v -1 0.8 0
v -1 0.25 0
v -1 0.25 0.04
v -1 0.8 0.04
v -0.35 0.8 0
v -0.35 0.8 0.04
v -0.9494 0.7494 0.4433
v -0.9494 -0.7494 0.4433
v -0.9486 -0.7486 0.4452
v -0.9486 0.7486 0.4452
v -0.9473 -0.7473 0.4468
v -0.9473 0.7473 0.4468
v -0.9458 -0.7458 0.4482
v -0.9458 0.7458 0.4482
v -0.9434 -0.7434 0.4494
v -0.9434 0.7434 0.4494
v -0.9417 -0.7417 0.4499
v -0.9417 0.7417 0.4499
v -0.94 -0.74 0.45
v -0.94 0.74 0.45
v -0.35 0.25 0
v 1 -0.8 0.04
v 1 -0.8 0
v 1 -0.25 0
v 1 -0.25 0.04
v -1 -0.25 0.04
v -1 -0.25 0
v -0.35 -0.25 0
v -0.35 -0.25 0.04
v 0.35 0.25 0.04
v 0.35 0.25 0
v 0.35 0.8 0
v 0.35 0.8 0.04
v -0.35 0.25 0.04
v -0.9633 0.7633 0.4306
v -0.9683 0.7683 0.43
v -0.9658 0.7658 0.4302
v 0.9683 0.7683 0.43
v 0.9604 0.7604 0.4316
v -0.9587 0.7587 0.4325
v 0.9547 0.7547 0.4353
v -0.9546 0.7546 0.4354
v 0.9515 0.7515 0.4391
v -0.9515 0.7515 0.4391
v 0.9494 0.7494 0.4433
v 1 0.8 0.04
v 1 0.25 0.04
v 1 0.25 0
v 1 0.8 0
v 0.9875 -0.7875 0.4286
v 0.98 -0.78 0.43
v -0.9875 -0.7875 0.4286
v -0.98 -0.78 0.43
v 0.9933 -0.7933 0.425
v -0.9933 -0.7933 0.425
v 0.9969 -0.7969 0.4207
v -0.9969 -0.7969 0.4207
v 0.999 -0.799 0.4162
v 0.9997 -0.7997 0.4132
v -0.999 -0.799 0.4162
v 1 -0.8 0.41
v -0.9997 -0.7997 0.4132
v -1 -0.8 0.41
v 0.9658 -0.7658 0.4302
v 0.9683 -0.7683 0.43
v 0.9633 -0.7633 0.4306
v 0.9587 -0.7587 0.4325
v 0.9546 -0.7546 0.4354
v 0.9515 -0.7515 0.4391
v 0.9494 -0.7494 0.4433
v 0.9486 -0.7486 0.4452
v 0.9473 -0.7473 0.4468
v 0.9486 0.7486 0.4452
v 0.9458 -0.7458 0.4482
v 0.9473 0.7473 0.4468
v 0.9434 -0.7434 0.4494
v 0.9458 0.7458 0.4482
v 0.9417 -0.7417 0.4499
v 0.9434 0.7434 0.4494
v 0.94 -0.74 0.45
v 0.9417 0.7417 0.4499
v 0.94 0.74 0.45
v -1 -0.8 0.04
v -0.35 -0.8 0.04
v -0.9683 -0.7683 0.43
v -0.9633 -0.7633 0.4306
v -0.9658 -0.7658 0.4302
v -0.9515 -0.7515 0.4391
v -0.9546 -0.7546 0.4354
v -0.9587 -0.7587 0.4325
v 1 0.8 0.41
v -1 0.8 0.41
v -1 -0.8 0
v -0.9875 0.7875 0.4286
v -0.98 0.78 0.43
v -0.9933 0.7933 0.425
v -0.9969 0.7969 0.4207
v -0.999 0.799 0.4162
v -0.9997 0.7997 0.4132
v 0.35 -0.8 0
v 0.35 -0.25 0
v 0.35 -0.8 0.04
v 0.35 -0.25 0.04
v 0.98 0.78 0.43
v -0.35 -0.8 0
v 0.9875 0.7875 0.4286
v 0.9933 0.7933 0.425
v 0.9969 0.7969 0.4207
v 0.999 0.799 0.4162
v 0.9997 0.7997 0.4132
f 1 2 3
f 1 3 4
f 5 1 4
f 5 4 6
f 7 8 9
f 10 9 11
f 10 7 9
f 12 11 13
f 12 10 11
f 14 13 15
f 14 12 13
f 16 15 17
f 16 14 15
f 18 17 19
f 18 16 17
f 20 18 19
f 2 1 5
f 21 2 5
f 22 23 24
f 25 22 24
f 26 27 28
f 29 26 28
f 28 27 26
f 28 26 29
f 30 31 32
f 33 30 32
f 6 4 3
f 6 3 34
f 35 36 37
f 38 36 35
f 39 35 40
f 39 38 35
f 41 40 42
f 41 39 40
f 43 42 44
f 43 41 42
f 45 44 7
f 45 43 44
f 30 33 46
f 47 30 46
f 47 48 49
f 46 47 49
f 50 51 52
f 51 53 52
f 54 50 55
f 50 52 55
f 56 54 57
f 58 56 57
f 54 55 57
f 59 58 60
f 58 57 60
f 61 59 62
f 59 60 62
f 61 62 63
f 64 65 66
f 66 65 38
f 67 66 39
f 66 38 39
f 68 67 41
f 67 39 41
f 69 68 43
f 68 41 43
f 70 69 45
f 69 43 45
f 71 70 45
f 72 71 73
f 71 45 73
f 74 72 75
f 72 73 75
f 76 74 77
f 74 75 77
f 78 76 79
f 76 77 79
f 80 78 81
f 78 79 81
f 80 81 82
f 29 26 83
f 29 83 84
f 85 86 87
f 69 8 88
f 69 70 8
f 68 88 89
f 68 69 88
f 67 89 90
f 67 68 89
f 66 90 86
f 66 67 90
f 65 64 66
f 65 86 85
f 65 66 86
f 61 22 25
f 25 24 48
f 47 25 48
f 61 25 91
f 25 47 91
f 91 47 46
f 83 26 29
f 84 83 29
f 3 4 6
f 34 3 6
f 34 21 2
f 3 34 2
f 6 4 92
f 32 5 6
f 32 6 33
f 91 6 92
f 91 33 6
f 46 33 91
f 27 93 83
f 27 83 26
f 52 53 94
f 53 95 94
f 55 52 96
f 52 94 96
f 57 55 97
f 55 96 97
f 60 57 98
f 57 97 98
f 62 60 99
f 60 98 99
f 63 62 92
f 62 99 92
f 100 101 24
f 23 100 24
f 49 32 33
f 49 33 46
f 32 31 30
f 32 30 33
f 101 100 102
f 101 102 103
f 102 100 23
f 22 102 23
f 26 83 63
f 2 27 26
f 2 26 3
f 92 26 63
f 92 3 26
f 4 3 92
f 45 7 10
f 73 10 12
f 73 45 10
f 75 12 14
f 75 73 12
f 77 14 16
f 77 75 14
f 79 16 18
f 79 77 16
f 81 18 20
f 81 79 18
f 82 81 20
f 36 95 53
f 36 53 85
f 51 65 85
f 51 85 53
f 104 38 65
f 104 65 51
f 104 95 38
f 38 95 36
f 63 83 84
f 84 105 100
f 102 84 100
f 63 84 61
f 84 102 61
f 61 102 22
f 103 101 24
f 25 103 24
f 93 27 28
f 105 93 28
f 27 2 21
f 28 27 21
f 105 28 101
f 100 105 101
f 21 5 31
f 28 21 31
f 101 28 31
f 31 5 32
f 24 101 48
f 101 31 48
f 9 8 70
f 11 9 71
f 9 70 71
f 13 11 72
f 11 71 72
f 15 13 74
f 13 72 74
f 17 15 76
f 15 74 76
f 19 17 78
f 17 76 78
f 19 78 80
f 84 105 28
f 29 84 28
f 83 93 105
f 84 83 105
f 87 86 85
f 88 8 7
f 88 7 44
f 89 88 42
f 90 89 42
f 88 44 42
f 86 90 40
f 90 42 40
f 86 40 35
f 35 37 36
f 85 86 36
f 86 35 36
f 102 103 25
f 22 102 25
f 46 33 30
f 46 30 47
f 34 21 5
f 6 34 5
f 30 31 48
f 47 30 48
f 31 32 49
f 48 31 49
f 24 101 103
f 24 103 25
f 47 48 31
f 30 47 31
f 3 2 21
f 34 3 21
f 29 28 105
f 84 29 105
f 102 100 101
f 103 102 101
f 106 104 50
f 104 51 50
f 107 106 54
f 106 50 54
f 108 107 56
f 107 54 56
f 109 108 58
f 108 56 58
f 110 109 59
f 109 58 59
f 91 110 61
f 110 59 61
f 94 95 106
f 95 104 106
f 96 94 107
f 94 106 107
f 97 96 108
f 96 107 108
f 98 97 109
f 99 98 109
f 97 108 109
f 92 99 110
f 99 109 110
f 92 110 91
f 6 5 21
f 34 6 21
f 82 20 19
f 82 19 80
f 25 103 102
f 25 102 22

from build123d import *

# Parameters (mm, degrees)
SKETCH1_W             = 0.65
SKETCH1_H             = 0.55
BOSS_EXTRUDE1_DEPTH   = 0.04
BOSS_EXTRUDE1_2_DEPTH = 0.04
BOSS_EXTRUDE1_3_DEPTH = 0.04
BOSS_EXTRUDE1_4_DEPTH = 0.04
BOSS_EXTRUDE2_DEPTH   = 0.43
BOSS_EXTRUDE3_START   = 0.04
SKETCH1_4_W           = 0.65
SKETCH1_4_H           = 0.55
BOSS_EXTRUDE3_DEPTH   = 0.39
BOSS_EXTRUDE3_2_DEPTH = 0.39
BOSS_EXTRUDE3_3_DEPTH = 0.39
BOSS_EXTRUDE3_4_DEPTH = 0.39
SKETCH2_W             = 1.9
SKETCH2_H             = 1.5
BOSS_EXTRUDE4_DEPTH   = 0.02
FILLET1_R             = 0.01
FILLET4_R             = 0.02


with BuildPart() as part:
    # Sketch1 → Boss-Extrude1 (new body)
    with BuildSketch(Plane.XY):
        with Locations((-0.675, 0.525)):
            Rectangle(SKETCH1_W, SKETCH1_H)
    extrude(amount=BOSS_EXTRUDE1_DEPTH)


with BuildPart() as body_2:
    # Sketch1 → Boss-Extrude1 2 (new body)
    with BuildSketch(Plane.XY):
        with Locations((0.675, 0.525)):
            Rectangle(SKETCH1_W, SKETCH1_H)
    extrude(amount=BOSS_EXTRUDE1_2_DEPTH)


with BuildPart() as body_3:
    # Sketch1 → Boss-Extrude1 3 (new body)
    with BuildSketch(Plane.XY):
        with Locations((0.675, -0.525)):
            Rectangle(SKETCH1_W, SKETCH1_H)
    extrude(amount=BOSS_EXTRUDE1_3_DEPTH)


with BuildPart() as body_4:
    # Sketch1 → Boss-Extrude1 4 (new body)
    with BuildSketch(Plane.XY):
        with Locations((-0.675, -0.525)):
            Rectangle(SKETCH1_W, SKETCH1_H)
    extrude(amount=BOSS_EXTRUDE1_4_DEPTH)


with BuildPart() as body_5:
    # Sketch1<3> → Boss-Extrude2 (new body)
    with BuildSketch(Plane.XY):
        Polygon((-0.35, -0.25), (-0.35, -0.8), (0.35, -0.8), (0.35, -0.25), (1, -0.25), (1, 0.25), (0.35, 0.25), (0.35, 0.8), (-0.35, 0.8), (-0.35, 0.25), (-1, 0.25), (-1, -0.25), align=None)
    extrude(amount=BOSS_EXTRUDE2_DEPTH)



with BuildPart() as body_6:
    # Sketch1<4> → Boss-Extrude3 (new body)
    with BuildSketch(Plane.XY.offset(BOSS_EXTRUDE3_START)):
        with Locations((0.675, 0.525)):
            Rectangle(SKETCH1_4_W, SKETCH1_4_H)
    extrude(amount=BOSS_EXTRUDE3_DEPTH)


with BuildPart() as body_7:
    # Sketch1<4> → Boss-Extrude3 2 (new body)
    with BuildSketch(Plane.XY.offset(BOSS_EXTRUDE3_START)):
        with Locations((-0.675, 0.525)):
            Rectangle(SKETCH1_4_W, SKETCH1_4_H)
    extrude(amount=BOSS_EXTRUDE3_2_DEPTH)


with BuildPart() as body_8:
    # Sketch1<4> → Boss-Extrude3 3 (new body)
    with BuildSketch(Plane.XY.offset(BOSS_EXTRUDE3_START)):
        with Locations((0.675, -0.525)):
            Rectangle(SKETCH1_4_W, SKETCH1_4_H)
    extrude(amount=BOSS_EXTRUDE3_3_DEPTH)


with BuildPart() as body_9:
    # Sketch1<4> → Boss-Extrude3 4 (new body)
    with BuildSketch(Plane.XY.offset(BOSS_EXTRUDE3_START)):
        with Locations((-0.675, -0.525)):
            Rectangle(SKETCH1_4_W, SKETCH1_4_H)
    extrude(amount=BOSS_EXTRUDE3_4_DEPTH)


with BuildPart() as body_5_1:
    add(body_5.part)

    add(body_6.part)  # Boss-Extrude4 merges body 6

    add(body_7.part)  # Boss-Extrude4 merges body 7

    add(body_8.part)  # Boss-Extrude4 merges body 8

    add(body_9.part)  # Boss-Extrude4 merges body 9
    # Sketch2 → Boss-Extrude4 (add)
    with BuildSketch(Plane.XY.offset(0.43)):
        Rectangle(SKETCH2_W, SKETCH2_H)
    extrude(amount=BOSS_EXTRUDE4_DEPTH)

    # Fillet1
    fillet1_edges = [body_5_1.edges().sort_by_distance(p)[0] for p in [
        (0.95, 0, 0.45),
        (0, 0.75, 0.45),
        (-0.95, 0, 0.45),
        (0, -0.75, 0.45),
    ]]
    fillet(fillet1_edges, radius=FILLET1_R)

    # Fillet4
    fillet4_edges = [body_5_1.edges().sort_by_distance(p)[0] for p in [
        (-0.95, 0, 0.43),
        (0, -0.75, 0.43),
        (0.95, 0, 0.43),
        (0, 0.75, 0.43),
        (0, 0.8, 0.43),
        (1, 0, 0.43),
        (0, -0.8, 0.43),
        (-1, 0, 0.43),
    ]]
    fillet(fillet4_edges, radius=FILLET4_R)


solid = Compound([part.part, body_2.part, body_3.part, body_4.part, body_5_1.part])
